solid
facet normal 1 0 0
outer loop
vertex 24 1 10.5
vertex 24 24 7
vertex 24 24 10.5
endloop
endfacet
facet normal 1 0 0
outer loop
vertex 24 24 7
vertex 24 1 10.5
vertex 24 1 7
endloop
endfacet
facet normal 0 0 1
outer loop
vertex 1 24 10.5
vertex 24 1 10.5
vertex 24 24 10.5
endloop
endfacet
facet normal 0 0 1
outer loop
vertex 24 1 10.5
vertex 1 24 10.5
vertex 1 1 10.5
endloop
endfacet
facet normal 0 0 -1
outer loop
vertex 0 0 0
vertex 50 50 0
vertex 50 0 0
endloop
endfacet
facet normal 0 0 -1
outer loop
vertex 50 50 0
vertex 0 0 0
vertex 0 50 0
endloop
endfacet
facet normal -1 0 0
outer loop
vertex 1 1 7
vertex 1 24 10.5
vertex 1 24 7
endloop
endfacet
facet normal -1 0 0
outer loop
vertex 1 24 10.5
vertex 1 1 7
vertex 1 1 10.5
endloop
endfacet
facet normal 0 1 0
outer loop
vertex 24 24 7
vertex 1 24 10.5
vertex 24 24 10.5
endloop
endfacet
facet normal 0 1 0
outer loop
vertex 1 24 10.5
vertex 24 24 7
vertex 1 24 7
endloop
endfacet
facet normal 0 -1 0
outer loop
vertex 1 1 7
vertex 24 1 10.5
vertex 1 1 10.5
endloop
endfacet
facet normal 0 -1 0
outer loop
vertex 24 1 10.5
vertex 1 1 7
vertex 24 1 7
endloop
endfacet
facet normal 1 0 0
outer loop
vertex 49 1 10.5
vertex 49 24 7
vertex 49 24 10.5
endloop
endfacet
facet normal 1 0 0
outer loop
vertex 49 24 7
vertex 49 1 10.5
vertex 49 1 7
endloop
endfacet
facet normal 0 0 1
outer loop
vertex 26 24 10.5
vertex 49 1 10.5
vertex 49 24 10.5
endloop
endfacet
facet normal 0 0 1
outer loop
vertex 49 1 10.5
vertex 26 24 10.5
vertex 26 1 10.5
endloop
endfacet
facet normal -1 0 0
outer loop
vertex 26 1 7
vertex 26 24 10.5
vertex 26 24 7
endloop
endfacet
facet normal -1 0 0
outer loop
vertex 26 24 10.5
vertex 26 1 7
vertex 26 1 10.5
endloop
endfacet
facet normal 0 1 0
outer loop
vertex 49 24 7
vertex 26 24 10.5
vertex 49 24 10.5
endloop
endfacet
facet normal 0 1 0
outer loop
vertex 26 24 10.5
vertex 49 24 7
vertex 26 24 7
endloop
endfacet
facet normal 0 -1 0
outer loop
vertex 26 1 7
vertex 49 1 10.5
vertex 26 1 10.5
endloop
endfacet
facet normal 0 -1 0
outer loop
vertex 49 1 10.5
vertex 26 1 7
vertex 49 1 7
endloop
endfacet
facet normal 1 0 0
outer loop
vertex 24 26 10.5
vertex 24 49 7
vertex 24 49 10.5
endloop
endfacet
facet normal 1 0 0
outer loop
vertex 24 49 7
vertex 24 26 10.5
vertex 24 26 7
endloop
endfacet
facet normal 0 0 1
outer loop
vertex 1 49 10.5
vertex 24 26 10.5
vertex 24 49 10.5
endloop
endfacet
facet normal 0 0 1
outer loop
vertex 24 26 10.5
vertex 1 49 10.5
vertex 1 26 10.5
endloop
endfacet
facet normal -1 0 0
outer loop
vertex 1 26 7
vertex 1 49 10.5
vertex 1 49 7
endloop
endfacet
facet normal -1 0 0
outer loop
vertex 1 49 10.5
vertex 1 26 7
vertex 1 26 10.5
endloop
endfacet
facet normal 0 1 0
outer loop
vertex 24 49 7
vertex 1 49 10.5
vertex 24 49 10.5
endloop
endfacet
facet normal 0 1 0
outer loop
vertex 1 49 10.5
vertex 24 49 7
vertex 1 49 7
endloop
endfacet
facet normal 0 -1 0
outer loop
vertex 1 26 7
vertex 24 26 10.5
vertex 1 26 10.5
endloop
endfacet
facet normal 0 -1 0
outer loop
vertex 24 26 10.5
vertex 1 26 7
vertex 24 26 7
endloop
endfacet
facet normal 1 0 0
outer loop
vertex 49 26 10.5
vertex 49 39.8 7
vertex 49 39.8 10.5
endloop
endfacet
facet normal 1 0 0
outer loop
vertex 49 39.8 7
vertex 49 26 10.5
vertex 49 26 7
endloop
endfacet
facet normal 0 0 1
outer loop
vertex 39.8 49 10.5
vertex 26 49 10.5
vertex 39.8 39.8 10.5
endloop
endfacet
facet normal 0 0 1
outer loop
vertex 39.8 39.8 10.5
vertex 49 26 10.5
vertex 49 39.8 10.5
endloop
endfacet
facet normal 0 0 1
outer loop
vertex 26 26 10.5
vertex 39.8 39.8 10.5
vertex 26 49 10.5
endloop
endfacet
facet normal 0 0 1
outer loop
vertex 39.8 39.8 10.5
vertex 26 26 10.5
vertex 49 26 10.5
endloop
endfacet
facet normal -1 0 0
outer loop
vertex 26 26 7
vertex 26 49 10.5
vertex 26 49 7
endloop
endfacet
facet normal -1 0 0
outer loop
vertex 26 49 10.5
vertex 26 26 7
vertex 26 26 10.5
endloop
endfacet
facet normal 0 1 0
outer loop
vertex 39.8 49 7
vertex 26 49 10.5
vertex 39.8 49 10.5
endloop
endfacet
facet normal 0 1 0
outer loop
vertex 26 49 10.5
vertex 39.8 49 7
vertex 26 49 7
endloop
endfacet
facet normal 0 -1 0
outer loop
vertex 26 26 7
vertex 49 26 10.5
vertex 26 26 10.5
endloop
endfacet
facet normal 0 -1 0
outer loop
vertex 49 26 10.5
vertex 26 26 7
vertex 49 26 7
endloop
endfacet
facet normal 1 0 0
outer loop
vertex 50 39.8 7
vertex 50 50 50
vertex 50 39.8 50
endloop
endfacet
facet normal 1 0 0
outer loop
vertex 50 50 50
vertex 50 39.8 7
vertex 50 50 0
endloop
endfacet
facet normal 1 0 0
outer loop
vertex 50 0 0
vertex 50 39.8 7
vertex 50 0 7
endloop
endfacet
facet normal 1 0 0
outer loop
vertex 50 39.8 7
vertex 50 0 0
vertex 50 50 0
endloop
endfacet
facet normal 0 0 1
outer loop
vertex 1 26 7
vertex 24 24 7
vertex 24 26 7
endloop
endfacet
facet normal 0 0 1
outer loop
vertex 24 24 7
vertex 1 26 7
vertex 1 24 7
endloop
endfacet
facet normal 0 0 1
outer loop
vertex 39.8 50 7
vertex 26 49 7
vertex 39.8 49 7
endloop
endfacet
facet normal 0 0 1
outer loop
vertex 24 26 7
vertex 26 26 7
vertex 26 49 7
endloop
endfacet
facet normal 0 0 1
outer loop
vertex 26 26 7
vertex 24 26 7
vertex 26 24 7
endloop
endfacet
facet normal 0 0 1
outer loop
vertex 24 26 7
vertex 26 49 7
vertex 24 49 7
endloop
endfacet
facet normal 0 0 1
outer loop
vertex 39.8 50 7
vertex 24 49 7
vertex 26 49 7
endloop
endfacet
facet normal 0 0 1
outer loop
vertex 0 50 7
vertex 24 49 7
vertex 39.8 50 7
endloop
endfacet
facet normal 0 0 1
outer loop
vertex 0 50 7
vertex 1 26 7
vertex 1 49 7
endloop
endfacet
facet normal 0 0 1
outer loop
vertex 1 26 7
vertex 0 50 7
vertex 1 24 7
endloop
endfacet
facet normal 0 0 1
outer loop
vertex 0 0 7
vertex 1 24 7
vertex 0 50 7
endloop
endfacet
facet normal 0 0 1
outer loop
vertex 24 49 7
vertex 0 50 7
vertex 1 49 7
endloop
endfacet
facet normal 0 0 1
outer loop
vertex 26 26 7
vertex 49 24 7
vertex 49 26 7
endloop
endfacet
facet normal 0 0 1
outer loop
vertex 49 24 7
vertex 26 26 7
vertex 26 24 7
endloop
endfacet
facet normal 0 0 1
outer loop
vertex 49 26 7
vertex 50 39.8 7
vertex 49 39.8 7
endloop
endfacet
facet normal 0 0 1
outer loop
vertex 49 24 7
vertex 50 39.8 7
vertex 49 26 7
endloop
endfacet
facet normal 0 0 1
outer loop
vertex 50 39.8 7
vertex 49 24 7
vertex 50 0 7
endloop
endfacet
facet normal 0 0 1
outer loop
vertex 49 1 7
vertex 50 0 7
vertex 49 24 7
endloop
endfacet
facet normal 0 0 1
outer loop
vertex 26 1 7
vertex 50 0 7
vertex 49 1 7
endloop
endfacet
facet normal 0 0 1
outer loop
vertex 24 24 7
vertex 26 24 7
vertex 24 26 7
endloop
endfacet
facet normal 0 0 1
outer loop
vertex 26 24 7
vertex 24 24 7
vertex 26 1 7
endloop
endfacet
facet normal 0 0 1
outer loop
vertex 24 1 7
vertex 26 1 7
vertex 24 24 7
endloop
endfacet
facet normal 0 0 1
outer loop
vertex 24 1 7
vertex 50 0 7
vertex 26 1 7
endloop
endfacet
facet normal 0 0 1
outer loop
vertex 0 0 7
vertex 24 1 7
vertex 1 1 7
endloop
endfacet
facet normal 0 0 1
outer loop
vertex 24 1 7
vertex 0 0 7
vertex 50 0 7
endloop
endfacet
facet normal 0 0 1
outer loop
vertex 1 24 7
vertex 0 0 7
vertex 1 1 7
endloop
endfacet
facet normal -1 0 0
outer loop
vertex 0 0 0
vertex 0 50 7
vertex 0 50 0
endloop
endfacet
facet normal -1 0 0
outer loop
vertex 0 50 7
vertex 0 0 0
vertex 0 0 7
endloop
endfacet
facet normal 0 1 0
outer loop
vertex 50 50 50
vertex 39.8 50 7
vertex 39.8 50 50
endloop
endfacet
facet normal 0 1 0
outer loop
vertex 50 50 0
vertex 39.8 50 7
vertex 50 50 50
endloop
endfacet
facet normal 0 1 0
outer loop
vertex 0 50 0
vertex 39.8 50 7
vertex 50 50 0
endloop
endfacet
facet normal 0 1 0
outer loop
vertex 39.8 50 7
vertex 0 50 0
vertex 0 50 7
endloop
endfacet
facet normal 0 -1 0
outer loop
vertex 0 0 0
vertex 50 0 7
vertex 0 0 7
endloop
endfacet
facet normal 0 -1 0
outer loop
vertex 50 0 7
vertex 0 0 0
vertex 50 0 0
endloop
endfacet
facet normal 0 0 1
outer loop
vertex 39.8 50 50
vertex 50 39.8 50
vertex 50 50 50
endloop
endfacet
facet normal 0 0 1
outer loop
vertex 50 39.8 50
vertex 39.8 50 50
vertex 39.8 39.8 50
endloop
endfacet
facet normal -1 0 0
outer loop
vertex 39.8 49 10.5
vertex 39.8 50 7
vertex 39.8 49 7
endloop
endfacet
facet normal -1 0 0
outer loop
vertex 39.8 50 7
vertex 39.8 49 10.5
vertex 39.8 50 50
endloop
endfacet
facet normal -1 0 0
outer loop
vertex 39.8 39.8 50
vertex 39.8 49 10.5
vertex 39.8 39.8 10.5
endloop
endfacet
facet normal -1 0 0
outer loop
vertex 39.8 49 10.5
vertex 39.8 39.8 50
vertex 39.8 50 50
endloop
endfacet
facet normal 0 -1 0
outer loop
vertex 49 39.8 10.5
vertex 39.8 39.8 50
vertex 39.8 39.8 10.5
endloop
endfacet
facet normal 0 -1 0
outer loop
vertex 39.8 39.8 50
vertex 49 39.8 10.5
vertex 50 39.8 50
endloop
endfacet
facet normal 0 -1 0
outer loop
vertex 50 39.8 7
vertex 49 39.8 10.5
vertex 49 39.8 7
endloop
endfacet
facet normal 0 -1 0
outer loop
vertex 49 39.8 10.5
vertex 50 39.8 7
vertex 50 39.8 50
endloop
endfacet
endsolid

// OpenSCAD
color("LightGray") {
    translate([1,1,0]) cube([23,23,6+4.5]);
    translate([25+1,1,0]) cube([23,23,6+4.5]);
    translate([1,25+1,0]) cube([23,23,6+4.5]);
    translate([25+1,25+1,0]) cube([23,23,6+4.5]);
}
color("Grey") {
    cube([50,50,7]);
    translate([50-10.2,50-10.2,0]) cube([10.2,10.2,50]);
}
